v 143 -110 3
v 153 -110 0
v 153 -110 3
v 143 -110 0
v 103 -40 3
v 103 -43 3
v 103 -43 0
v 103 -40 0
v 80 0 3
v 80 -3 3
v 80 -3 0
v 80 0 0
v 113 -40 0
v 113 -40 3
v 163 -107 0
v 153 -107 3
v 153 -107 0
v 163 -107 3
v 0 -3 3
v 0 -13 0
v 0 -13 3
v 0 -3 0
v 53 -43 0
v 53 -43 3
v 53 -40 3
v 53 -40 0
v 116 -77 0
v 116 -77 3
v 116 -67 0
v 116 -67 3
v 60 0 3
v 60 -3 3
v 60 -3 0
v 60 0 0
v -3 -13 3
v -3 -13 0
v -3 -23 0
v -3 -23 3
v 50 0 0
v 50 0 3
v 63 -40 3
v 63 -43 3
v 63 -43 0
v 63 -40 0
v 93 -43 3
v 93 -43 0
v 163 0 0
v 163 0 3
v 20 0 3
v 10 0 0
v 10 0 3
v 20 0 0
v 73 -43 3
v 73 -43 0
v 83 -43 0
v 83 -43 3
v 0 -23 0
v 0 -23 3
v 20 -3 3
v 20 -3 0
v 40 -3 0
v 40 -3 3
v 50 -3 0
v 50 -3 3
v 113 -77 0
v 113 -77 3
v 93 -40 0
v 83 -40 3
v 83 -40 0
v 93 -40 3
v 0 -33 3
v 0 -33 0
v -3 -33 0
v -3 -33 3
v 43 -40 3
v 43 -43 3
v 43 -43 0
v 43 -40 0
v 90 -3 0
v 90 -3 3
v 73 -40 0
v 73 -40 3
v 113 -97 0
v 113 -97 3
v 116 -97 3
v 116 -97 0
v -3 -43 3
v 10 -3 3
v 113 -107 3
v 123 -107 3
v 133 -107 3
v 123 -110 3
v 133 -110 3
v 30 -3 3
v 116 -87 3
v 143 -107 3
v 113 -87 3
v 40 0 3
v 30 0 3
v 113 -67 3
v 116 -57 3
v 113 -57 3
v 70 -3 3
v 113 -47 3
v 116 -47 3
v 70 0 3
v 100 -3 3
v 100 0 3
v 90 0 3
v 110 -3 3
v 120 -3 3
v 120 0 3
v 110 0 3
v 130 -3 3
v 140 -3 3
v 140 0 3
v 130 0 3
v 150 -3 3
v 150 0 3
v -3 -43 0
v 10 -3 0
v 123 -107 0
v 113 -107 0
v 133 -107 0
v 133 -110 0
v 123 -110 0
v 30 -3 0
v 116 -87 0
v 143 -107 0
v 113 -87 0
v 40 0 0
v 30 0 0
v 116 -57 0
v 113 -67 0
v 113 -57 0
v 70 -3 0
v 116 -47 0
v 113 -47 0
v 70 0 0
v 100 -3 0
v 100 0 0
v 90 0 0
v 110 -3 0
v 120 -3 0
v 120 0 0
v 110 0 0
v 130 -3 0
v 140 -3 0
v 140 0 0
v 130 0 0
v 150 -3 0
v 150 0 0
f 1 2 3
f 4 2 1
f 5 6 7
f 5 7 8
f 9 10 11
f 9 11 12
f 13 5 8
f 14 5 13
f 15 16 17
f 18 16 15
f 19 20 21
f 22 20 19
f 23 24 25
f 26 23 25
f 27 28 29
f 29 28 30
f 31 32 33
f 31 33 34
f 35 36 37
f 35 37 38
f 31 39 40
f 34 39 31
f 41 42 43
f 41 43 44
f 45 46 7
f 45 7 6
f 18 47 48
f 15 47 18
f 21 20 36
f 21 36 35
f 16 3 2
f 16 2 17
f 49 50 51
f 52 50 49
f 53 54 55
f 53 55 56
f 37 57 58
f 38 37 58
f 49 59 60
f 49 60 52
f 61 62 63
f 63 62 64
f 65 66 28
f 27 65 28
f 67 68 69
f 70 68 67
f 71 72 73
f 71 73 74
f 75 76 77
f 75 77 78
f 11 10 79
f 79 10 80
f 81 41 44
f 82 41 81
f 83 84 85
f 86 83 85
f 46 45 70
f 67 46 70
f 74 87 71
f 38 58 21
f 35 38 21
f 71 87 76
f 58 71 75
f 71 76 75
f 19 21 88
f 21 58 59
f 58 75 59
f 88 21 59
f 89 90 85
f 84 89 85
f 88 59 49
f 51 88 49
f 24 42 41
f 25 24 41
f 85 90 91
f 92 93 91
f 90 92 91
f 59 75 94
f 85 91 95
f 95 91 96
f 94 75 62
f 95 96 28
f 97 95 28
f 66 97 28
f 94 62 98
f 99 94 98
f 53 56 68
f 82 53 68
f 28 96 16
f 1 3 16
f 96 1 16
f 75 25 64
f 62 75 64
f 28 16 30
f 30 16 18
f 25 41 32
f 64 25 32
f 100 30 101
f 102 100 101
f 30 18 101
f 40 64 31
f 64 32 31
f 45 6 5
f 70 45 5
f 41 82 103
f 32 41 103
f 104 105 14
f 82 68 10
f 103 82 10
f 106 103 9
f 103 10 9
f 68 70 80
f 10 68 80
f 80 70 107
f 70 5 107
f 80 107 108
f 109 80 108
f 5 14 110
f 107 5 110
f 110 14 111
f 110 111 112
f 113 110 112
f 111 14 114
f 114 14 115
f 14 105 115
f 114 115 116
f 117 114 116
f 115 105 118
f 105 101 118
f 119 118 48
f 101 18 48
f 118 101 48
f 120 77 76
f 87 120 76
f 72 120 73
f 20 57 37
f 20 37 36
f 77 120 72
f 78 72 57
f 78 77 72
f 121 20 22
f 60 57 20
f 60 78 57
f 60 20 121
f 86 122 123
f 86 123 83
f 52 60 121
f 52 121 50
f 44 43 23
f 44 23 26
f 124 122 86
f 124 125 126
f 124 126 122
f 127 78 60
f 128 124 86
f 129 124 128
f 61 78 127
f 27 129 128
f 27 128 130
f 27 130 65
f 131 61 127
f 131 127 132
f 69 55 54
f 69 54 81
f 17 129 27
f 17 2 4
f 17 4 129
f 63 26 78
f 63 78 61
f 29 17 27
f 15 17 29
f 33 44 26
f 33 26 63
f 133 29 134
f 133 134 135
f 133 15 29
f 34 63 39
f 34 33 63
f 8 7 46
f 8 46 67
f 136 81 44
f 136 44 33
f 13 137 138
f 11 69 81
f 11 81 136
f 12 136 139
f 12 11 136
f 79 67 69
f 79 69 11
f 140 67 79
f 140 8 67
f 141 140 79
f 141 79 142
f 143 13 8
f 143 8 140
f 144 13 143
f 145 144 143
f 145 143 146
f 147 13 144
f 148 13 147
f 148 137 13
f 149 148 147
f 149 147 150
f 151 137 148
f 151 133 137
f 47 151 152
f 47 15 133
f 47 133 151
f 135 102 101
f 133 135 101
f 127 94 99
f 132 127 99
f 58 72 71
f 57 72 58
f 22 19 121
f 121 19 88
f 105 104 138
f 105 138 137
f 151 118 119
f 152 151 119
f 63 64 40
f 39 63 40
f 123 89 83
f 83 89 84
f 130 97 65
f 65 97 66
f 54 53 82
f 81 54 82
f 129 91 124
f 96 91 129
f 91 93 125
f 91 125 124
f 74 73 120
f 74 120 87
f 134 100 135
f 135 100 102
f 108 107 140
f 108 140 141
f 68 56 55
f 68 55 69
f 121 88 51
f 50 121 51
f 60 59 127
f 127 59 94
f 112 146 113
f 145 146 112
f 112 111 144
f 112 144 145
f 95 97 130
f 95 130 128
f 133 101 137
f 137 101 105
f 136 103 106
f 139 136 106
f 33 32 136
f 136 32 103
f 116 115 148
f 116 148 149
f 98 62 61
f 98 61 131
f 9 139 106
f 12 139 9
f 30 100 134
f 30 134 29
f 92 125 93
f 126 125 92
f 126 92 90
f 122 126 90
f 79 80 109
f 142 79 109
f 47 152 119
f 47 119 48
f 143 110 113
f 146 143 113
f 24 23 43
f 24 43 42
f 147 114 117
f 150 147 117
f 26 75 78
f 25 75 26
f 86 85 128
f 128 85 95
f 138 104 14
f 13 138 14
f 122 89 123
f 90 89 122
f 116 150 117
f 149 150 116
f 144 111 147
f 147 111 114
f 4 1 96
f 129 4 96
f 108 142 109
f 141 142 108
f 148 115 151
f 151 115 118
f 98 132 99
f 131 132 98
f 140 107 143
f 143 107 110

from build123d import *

# Parameters (mm, degrees)
BOSS_EXTRU_1_DEPTH         = 3
ESQUISSE2_W                = 10
ESQUISSE2_H                = 3
ENL_V_MAT_EXTRU_1_DEPTH    = 3
R_P_TITION_LIN_AIRE1_COUNT = 8
R_P_TITION_LIN_AIRE1_PITCH = 20
ESQUISSE4_W                = 3
ESQUISSE4_H                = 10
BOSS_EXTRU_2_DEPTH         = 3
R_P_TITION_LIN_AIRE3_COUNT = 2
R_P_TITION_LIN_AIRE3_PITCH = 20
ESQUISSE5_W                = 10
ESQUISSE5_H                = 3
ENL_V_MAT_EXTRU_3_DEPTH    = 3
R_P_TITION_LIN_AIRE4_COUNT = 4
R_P_TITION_LIN_AIRE4_PITCH = 20
ESQUISSE6_W                = 10
ESQUISSE6_H                = 3
ENL_V_MAT_EXTRU_4_DEPTH    = 3
R_P_TITION_LIN_AIRE5_COUNT = 3
R_P_TITION_LIN_AIRE5_PITCH = 20
ESQUISSE7_W                = 3
ESQUISSE7_H                = 10
ENL_V_MAT_EXTRU_5_DEPTH    = 3
R_P_TITION_LIN_AIRE6_COUNT = 3
R_P_TITION_LIN_AIRE6_PITCH = 20


with BuildPart() as part:
    # Esquisse1 → Boss.-Extru.1 (new body)
    with BuildSketch(Plane.XY):
        Polygon((163, 0), (163, -110), (113, -110), (113, -43), (0, -43), (0, 0), align=None)
    extrude(amount=BOSS_EXTRU_1_DEPTH)

    # Esquisse2 → Enlèv. mat.-Extru.1 (cut)
    with BuildSketch(Plane.XY.offset(3)):
        with Locations((5, -1.5)):
            Rectangle(ESQUISSE2_W, ESQUISSE2_H)
    enl_v_mat_extru_1 = extrude(amount=-ENL_V_MAT_EXTRU_1_DEPTH, mode=Mode.SUBTRACT)

    # Répétition linéaire1: Enlèv. mat.-Extru.1 ×8
    with Locations(*[(i * R_P_TITION_LIN_AIRE1_PITCH, 0, 0) for i in range(1, R_P_TITION_LIN_AIRE1_COUNT)]):
        add(enl_v_mat_extru_1, mode=Mode.SUBTRACT)

    # Esquisse4 → Boss.-Extru.2 (add)
    with BuildSketch(Plane.ZY):
        with Locations((1.5, -38)):
            Rectangle(ESQUISSE4_W, ESQUISSE4_H)
    boss_extru_2 = extrude(amount=BOSS_EXTRU_2_DEPTH)

    # Répétition linéaire3: Boss.-Extru.2 ×2
    with Locations(*[(0, i * R_P_TITION_LIN_AIRE3_PITCH, 0) for i in range(1, R_P_TITION_LIN_AIRE3_COUNT)]):
        add(boss_extru_2)

    # Esquisse5 → Enlèv. mat.-Extru.3 (cut)
    with BuildSketch(Plane.XY.offset(3)):
        with Locations((108, -41.5)):
            Rectangle(ESQUISSE5_W, ESQUISSE5_H)
    enl_v_mat_extru_3 = extrude(amount=-ENL_V_MAT_EXTRU_3_DEPTH, mode=Mode.SUBTRACT)

    # Répétition linéaire4: Enlèv. mat.-Extru.3 ×4
    with Locations(*[(-i * R_P_TITION_LIN_AIRE4_PITCH, 0, 0) for i in range(1, R_P_TITION_LIN_AIRE4_COUNT)]):
        add(enl_v_mat_extru_3, mode=Mode.SUBTRACT)

    # Esquisse6 → Enlèv. mat.-Extru.4 (cut)
    with BuildSketch(Plane.XY.offset(3)):
        with Locations((118, -108.5)):
            Rectangle(ESQUISSE6_W, ESQUISSE6_H)
    enl_v_mat_extru_4 = extrude(amount=-ENL_V_MAT_EXTRU_4_DEPTH, mode=Mode.SUBTRACT)

    # Répétition linéaire5: Enlèv. mat.-Extru.4 ×3
    with Locations(*[(i * R_P_TITION_LIN_AIRE5_PITCH, 0, 0) for i in range(1, R_P_TITION_LIN_AIRE5_COUNT)]):
        add(enl_v_mat_extru_4, mode=Mode.SUBTRACT)

    # Esquisse7 → Enlèv. mat.-Extru.5 (cut)
    with BuildSketch(Plane.XY.offset(3)):
        with Locations((114.5, -92)):
            Rectangle(ESQUISSE7_W, ESQUISSE7_H)
    enl_v_mat_extru_5 = extrude(amount=-ENL_V_MAT_EXTRU_5_DEPTH, mode=Mode.SUBTRACT)

    # Répétition linéaire6: Enlèv. mat.-Extru.5 ×3
    with Locations(*[(0, i * R_P_TITION_LIN_AIRE6_PITCH, 0) for i in range(1, R_P_TITION_LIN_AIRE6_COUNT)]):
        add(enl_v_mat_extru_5, mode=Mode.SUBTRACT)


solid = part.part
